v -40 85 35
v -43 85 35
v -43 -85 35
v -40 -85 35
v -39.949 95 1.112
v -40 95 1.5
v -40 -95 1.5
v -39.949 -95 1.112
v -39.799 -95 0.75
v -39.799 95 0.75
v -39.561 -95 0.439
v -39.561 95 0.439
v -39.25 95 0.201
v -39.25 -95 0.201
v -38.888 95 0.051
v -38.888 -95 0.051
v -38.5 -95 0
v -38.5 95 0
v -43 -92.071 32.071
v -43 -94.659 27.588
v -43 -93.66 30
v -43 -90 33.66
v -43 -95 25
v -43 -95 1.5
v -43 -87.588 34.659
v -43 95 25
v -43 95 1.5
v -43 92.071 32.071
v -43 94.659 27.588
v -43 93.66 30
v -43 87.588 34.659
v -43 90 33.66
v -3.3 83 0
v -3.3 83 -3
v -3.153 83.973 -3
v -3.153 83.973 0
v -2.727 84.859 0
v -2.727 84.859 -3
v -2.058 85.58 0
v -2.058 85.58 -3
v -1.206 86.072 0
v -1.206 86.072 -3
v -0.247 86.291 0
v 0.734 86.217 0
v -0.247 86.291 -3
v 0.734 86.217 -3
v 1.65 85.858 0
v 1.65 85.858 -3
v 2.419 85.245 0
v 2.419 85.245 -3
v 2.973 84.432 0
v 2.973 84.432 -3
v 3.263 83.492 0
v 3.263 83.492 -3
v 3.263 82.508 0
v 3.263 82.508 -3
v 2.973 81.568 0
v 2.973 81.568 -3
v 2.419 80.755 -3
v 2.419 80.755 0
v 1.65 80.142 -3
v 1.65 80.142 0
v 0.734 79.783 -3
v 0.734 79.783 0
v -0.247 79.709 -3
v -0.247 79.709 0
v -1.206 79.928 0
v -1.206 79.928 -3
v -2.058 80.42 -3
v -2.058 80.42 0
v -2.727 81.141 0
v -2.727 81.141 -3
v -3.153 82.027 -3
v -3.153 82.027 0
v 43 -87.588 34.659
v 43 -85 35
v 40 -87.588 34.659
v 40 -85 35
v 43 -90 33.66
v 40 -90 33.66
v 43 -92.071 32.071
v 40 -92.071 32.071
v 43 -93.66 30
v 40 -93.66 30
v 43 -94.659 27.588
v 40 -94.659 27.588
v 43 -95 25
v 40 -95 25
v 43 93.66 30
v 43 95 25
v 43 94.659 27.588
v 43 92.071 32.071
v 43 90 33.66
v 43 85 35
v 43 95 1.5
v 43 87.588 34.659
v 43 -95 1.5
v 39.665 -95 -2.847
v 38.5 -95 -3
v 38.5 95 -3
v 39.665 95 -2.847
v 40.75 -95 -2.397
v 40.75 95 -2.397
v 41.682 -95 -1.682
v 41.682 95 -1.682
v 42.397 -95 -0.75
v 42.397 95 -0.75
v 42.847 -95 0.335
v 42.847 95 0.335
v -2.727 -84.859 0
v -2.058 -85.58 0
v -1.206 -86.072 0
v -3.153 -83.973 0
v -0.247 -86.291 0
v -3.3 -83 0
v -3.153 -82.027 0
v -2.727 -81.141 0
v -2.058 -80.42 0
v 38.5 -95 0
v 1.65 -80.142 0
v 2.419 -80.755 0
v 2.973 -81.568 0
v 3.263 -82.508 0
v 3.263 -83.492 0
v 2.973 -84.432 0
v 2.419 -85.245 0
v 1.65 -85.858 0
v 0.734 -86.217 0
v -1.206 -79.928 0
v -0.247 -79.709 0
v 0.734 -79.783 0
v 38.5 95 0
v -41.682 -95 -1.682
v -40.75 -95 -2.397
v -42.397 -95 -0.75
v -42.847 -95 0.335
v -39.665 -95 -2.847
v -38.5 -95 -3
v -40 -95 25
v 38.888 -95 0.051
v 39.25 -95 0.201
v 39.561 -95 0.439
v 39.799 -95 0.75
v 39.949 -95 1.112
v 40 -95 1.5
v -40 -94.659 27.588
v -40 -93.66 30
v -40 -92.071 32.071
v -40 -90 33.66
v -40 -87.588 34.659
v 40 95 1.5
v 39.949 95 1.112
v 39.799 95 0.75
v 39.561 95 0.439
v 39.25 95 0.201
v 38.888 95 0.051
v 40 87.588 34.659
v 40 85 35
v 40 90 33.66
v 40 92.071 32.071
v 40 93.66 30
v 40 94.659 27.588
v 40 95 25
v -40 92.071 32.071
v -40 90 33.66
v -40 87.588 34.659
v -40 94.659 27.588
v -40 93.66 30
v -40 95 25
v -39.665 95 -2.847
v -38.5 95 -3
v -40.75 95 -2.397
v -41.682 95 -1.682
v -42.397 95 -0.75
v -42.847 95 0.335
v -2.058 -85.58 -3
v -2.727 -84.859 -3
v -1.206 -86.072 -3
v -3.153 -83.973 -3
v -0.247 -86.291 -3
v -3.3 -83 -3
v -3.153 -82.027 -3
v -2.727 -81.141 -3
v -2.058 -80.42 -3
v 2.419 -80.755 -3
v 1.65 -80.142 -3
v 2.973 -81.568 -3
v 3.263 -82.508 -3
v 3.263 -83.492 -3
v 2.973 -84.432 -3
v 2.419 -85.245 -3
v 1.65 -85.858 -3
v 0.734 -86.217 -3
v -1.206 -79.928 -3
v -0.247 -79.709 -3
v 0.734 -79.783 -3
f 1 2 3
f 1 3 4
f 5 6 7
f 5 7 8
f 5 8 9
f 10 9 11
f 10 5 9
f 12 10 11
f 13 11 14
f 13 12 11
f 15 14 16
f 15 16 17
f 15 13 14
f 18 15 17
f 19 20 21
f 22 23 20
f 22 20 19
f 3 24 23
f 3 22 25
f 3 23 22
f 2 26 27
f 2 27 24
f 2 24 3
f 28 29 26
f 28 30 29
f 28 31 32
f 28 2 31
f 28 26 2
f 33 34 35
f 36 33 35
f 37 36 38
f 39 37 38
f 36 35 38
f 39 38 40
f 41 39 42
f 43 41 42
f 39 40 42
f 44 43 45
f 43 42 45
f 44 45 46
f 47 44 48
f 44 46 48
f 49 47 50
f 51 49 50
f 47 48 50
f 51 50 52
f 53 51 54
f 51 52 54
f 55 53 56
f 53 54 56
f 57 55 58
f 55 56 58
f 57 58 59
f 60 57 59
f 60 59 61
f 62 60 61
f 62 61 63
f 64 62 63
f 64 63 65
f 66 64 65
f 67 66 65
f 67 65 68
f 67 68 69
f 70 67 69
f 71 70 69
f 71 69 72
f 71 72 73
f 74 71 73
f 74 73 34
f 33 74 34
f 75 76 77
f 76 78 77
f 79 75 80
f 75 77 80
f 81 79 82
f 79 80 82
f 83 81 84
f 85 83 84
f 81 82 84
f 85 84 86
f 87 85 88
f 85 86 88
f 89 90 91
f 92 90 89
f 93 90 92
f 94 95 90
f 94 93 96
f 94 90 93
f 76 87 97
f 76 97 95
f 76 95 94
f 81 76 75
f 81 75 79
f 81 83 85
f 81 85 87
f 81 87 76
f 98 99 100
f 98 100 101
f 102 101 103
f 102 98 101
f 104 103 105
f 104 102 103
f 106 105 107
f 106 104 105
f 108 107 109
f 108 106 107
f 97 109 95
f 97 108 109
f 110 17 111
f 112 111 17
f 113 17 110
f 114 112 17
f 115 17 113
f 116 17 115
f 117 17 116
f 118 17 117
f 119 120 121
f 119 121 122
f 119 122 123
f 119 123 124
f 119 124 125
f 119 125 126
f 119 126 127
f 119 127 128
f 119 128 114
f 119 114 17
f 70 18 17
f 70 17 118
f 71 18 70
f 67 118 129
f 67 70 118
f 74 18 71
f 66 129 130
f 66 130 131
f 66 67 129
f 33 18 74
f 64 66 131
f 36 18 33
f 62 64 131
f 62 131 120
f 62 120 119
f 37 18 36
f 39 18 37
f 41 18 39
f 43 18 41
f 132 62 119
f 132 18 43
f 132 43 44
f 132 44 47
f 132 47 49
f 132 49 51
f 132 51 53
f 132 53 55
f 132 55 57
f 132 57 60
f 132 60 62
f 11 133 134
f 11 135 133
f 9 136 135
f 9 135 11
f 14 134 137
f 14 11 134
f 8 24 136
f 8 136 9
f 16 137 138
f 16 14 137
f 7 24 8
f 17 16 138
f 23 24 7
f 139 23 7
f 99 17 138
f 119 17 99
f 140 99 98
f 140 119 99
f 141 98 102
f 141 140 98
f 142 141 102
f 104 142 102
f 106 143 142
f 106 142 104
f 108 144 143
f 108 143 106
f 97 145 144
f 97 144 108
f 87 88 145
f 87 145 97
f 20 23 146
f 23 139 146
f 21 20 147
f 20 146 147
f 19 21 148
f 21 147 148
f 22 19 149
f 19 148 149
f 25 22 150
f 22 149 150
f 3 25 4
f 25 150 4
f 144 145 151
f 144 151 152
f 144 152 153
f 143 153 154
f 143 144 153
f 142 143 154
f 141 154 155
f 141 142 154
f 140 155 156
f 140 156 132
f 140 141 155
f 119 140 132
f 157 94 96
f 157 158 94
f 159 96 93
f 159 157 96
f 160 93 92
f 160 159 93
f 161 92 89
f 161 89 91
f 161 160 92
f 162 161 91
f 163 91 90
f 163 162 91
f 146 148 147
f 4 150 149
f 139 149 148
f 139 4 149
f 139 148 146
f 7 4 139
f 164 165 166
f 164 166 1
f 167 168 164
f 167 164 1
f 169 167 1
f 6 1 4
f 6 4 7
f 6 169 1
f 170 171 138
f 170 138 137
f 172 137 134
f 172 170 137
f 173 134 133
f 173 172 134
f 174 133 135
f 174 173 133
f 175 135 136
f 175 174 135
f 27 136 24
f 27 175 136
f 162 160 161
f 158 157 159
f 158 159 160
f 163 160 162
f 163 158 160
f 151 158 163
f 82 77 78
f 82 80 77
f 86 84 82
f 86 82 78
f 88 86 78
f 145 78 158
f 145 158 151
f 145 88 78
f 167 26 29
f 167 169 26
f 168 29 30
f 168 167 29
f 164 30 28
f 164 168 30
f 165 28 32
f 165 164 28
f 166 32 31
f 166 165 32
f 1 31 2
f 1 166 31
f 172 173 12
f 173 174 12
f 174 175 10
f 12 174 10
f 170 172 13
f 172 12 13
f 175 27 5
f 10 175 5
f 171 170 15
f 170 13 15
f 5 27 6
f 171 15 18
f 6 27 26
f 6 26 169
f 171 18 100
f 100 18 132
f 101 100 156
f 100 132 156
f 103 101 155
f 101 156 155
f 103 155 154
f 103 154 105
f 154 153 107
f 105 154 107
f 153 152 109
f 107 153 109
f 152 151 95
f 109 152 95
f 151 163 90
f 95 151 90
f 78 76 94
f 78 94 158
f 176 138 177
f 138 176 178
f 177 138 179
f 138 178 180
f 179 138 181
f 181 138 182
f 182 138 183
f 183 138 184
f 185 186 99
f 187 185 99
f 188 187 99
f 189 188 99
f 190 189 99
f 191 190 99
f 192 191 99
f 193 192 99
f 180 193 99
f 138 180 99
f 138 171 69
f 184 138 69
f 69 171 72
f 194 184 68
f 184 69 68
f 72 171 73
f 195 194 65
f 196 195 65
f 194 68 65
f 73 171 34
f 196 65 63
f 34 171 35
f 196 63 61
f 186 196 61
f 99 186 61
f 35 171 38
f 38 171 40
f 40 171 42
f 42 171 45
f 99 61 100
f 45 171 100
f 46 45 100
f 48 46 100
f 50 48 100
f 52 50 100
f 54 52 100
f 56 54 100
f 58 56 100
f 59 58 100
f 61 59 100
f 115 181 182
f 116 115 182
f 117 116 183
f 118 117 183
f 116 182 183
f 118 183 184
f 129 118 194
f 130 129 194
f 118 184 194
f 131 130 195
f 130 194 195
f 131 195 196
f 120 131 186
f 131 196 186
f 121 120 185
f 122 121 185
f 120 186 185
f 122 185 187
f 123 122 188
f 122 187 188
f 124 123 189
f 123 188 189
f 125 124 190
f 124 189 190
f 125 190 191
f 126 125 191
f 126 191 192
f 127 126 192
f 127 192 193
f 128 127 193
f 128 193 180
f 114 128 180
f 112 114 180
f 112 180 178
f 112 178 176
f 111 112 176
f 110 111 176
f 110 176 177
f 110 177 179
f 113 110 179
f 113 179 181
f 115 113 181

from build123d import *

# Parameters (mm, degrees)
CROQUIS1_W                         = 80
CROQUIS1_H                         = 190
BRIDA_BASE1_DEPTH                  = 3
BRIDA_DE_ARISTA1_STRIP_W           = 15
BRIDA_DE_ARISTA1_STRIP_H           = 3
BRIDA_DE_ARISTA1_STRIP_CUT_DEPTH   = 190
BRIDA_DE_ARISTA1_STRIP_2_W         = 15
BRIDA_DE_ARISTA1_STRIP_2_H         = 3
BRIDA_DE_ARISTA1_STRIP_CUT_2_DEPTH = 190
BRIDA_DE_ARISTA1_DEPTH             = 190
BRIDA_DE_ARISTA1_BEND_DEPTH        = 190
TALADRO_DE_MARGEN_PARA_M61_D       = 6.6
TALADRO_DE_MARGEN_PARA_M61_DEPTH   = 500
TALADRO_DE_MARGEN_PARA_M61_TIP     = 1.982840043
REDONDEO2_R                        = 10


# Sheet-metal steps are written as plain solids
with BuildPart() as part:
    # Croquis1 → Brida base1 (new body)
    with BuildSketch(Plane.XY):
        Rectangle(CROQUIS1_W, CROQUIS1_H)
    extrude(amount=-BRIDA_BASE1_DEPTH)

    # Brida de arista1 strip (across the edge) → Brida de arista1 strip cut (cut)
    with BuildSketch(Plane(origin=(-40, 95, 0), x_dir=(1, 0, 0), z_dir=(0, -1, 0))):
        with Locations((-6, -1.5)):
            Rectangle(BRIDA_DE_ARISTA1_STRIP_W, BRIDA_DE_ARISTA1_STRIP_H)
    extrude(amount=BRIDA_DE_ARISTA1_STRIP_CUT_DEPTH, mode=Mode.SUBTRACT)

    # Brida de arista1 strip 2 (across the edge) → Brida de arista1 strip cut 2 (cut)
    with BuildSketch(Plane(origin=(40, -95, 0), x_dir=(-1, 0, 0), z_dir=(0, 1, 0))):
        with Locations((-6, -1.5)):
            Rectangle(BRIDA_DE_ARISTA1_STRIP_2_W, BRIDA_DE_ARISTA1_STRIP_2_H)
    extrude(amount=BRIDA_DE_ARISTA1_STRIP_CUT_2_DEPTH, mode=Mode.SUBTRACT)

    # Brida de arista1 section (across the edge) → Brida de arista1 (add)
    with BuildSketch(Plane(origin=(-40, 95, 0), x_dir=(1, 0, 0), z_dir=(0, -1, 0))):
        with BuildLine():
            Line((-3, 1.5), (-3, 35))
            Line((-3, 35), (0, 35))
            Line((0, 35), (0, 1.5))
            ThreePointArc((0, 1.5), (0.439339828, 0.439339828), (1.5, 0))
            Line((1.5, 0), (1.5, -3))
            ThreePointArc((1.5, -3), (-1.681980515, -1.681980515), (-3, 1.5))
        make_face()
    extrude(amount=BRIDA_DE_ARISTA1_DEPTH)

    # Brida de arista1 section 2 (across the edge) → Brida de arista1 bend (add)
    with BuildSketch(Plane(origin=(40, -95, 0), x_dir=(-1, 0, 0), z_dir=(0, 1, 0))):
        with BuildLine():
            Line((-3, 1.5), (-3, 35))
            Line((-3, 35), (0, 35))
            Line((0, 35), (0, 1.5))
            ThreePointArc((0, 1.5), (0.439339828, 0.439339828), (1.5, 0))
            Line((1.5, 0), (1.5, -3))
            ThreePointArc((1.5, -3), (-1.681980515, -1.681980515), (-3, 1.5))
        make_face()
    extrude(amount=BRIDA_DE_ARISTA1_BEND_DEPTH)

    # Taladro de margen para M61
    with Locations(Plane.XY):
        with Locations((0, 83), (0, -83)):
            Hole(TALADRO_DE_MARGEN_PARA_M61_D / 2, depth=TALADRO_DE_MARGEN_PARA_M61_DEPTH)
            with Locations((0, 0, -(TALADRO_DE_MARGEN_PARA_M61_DEPTH + TALADRO_DE_MARGEN_PARA_M61_TIP / 2))):  # 118° drill point
                Cone(0, TALADRO_DE_MARGEN_PARA_M61_D / 2, TALADRO_DE_MARGEN_PARA_M61_TIP, mode=Mode.SUBTRACT)

    # Redondeo2
    redondeo2_edges = [part.edges().sort_by_distance(p)[0] for p in [
        (-41.5, 95, 35),
        (-41.5, -95, 35),
        (41.5, -95, 35),
        (41.5, 95, 35),
    ]]
    fillet(redondeo2_edges, radius=REDONDEO2_R)


solid = part.part
